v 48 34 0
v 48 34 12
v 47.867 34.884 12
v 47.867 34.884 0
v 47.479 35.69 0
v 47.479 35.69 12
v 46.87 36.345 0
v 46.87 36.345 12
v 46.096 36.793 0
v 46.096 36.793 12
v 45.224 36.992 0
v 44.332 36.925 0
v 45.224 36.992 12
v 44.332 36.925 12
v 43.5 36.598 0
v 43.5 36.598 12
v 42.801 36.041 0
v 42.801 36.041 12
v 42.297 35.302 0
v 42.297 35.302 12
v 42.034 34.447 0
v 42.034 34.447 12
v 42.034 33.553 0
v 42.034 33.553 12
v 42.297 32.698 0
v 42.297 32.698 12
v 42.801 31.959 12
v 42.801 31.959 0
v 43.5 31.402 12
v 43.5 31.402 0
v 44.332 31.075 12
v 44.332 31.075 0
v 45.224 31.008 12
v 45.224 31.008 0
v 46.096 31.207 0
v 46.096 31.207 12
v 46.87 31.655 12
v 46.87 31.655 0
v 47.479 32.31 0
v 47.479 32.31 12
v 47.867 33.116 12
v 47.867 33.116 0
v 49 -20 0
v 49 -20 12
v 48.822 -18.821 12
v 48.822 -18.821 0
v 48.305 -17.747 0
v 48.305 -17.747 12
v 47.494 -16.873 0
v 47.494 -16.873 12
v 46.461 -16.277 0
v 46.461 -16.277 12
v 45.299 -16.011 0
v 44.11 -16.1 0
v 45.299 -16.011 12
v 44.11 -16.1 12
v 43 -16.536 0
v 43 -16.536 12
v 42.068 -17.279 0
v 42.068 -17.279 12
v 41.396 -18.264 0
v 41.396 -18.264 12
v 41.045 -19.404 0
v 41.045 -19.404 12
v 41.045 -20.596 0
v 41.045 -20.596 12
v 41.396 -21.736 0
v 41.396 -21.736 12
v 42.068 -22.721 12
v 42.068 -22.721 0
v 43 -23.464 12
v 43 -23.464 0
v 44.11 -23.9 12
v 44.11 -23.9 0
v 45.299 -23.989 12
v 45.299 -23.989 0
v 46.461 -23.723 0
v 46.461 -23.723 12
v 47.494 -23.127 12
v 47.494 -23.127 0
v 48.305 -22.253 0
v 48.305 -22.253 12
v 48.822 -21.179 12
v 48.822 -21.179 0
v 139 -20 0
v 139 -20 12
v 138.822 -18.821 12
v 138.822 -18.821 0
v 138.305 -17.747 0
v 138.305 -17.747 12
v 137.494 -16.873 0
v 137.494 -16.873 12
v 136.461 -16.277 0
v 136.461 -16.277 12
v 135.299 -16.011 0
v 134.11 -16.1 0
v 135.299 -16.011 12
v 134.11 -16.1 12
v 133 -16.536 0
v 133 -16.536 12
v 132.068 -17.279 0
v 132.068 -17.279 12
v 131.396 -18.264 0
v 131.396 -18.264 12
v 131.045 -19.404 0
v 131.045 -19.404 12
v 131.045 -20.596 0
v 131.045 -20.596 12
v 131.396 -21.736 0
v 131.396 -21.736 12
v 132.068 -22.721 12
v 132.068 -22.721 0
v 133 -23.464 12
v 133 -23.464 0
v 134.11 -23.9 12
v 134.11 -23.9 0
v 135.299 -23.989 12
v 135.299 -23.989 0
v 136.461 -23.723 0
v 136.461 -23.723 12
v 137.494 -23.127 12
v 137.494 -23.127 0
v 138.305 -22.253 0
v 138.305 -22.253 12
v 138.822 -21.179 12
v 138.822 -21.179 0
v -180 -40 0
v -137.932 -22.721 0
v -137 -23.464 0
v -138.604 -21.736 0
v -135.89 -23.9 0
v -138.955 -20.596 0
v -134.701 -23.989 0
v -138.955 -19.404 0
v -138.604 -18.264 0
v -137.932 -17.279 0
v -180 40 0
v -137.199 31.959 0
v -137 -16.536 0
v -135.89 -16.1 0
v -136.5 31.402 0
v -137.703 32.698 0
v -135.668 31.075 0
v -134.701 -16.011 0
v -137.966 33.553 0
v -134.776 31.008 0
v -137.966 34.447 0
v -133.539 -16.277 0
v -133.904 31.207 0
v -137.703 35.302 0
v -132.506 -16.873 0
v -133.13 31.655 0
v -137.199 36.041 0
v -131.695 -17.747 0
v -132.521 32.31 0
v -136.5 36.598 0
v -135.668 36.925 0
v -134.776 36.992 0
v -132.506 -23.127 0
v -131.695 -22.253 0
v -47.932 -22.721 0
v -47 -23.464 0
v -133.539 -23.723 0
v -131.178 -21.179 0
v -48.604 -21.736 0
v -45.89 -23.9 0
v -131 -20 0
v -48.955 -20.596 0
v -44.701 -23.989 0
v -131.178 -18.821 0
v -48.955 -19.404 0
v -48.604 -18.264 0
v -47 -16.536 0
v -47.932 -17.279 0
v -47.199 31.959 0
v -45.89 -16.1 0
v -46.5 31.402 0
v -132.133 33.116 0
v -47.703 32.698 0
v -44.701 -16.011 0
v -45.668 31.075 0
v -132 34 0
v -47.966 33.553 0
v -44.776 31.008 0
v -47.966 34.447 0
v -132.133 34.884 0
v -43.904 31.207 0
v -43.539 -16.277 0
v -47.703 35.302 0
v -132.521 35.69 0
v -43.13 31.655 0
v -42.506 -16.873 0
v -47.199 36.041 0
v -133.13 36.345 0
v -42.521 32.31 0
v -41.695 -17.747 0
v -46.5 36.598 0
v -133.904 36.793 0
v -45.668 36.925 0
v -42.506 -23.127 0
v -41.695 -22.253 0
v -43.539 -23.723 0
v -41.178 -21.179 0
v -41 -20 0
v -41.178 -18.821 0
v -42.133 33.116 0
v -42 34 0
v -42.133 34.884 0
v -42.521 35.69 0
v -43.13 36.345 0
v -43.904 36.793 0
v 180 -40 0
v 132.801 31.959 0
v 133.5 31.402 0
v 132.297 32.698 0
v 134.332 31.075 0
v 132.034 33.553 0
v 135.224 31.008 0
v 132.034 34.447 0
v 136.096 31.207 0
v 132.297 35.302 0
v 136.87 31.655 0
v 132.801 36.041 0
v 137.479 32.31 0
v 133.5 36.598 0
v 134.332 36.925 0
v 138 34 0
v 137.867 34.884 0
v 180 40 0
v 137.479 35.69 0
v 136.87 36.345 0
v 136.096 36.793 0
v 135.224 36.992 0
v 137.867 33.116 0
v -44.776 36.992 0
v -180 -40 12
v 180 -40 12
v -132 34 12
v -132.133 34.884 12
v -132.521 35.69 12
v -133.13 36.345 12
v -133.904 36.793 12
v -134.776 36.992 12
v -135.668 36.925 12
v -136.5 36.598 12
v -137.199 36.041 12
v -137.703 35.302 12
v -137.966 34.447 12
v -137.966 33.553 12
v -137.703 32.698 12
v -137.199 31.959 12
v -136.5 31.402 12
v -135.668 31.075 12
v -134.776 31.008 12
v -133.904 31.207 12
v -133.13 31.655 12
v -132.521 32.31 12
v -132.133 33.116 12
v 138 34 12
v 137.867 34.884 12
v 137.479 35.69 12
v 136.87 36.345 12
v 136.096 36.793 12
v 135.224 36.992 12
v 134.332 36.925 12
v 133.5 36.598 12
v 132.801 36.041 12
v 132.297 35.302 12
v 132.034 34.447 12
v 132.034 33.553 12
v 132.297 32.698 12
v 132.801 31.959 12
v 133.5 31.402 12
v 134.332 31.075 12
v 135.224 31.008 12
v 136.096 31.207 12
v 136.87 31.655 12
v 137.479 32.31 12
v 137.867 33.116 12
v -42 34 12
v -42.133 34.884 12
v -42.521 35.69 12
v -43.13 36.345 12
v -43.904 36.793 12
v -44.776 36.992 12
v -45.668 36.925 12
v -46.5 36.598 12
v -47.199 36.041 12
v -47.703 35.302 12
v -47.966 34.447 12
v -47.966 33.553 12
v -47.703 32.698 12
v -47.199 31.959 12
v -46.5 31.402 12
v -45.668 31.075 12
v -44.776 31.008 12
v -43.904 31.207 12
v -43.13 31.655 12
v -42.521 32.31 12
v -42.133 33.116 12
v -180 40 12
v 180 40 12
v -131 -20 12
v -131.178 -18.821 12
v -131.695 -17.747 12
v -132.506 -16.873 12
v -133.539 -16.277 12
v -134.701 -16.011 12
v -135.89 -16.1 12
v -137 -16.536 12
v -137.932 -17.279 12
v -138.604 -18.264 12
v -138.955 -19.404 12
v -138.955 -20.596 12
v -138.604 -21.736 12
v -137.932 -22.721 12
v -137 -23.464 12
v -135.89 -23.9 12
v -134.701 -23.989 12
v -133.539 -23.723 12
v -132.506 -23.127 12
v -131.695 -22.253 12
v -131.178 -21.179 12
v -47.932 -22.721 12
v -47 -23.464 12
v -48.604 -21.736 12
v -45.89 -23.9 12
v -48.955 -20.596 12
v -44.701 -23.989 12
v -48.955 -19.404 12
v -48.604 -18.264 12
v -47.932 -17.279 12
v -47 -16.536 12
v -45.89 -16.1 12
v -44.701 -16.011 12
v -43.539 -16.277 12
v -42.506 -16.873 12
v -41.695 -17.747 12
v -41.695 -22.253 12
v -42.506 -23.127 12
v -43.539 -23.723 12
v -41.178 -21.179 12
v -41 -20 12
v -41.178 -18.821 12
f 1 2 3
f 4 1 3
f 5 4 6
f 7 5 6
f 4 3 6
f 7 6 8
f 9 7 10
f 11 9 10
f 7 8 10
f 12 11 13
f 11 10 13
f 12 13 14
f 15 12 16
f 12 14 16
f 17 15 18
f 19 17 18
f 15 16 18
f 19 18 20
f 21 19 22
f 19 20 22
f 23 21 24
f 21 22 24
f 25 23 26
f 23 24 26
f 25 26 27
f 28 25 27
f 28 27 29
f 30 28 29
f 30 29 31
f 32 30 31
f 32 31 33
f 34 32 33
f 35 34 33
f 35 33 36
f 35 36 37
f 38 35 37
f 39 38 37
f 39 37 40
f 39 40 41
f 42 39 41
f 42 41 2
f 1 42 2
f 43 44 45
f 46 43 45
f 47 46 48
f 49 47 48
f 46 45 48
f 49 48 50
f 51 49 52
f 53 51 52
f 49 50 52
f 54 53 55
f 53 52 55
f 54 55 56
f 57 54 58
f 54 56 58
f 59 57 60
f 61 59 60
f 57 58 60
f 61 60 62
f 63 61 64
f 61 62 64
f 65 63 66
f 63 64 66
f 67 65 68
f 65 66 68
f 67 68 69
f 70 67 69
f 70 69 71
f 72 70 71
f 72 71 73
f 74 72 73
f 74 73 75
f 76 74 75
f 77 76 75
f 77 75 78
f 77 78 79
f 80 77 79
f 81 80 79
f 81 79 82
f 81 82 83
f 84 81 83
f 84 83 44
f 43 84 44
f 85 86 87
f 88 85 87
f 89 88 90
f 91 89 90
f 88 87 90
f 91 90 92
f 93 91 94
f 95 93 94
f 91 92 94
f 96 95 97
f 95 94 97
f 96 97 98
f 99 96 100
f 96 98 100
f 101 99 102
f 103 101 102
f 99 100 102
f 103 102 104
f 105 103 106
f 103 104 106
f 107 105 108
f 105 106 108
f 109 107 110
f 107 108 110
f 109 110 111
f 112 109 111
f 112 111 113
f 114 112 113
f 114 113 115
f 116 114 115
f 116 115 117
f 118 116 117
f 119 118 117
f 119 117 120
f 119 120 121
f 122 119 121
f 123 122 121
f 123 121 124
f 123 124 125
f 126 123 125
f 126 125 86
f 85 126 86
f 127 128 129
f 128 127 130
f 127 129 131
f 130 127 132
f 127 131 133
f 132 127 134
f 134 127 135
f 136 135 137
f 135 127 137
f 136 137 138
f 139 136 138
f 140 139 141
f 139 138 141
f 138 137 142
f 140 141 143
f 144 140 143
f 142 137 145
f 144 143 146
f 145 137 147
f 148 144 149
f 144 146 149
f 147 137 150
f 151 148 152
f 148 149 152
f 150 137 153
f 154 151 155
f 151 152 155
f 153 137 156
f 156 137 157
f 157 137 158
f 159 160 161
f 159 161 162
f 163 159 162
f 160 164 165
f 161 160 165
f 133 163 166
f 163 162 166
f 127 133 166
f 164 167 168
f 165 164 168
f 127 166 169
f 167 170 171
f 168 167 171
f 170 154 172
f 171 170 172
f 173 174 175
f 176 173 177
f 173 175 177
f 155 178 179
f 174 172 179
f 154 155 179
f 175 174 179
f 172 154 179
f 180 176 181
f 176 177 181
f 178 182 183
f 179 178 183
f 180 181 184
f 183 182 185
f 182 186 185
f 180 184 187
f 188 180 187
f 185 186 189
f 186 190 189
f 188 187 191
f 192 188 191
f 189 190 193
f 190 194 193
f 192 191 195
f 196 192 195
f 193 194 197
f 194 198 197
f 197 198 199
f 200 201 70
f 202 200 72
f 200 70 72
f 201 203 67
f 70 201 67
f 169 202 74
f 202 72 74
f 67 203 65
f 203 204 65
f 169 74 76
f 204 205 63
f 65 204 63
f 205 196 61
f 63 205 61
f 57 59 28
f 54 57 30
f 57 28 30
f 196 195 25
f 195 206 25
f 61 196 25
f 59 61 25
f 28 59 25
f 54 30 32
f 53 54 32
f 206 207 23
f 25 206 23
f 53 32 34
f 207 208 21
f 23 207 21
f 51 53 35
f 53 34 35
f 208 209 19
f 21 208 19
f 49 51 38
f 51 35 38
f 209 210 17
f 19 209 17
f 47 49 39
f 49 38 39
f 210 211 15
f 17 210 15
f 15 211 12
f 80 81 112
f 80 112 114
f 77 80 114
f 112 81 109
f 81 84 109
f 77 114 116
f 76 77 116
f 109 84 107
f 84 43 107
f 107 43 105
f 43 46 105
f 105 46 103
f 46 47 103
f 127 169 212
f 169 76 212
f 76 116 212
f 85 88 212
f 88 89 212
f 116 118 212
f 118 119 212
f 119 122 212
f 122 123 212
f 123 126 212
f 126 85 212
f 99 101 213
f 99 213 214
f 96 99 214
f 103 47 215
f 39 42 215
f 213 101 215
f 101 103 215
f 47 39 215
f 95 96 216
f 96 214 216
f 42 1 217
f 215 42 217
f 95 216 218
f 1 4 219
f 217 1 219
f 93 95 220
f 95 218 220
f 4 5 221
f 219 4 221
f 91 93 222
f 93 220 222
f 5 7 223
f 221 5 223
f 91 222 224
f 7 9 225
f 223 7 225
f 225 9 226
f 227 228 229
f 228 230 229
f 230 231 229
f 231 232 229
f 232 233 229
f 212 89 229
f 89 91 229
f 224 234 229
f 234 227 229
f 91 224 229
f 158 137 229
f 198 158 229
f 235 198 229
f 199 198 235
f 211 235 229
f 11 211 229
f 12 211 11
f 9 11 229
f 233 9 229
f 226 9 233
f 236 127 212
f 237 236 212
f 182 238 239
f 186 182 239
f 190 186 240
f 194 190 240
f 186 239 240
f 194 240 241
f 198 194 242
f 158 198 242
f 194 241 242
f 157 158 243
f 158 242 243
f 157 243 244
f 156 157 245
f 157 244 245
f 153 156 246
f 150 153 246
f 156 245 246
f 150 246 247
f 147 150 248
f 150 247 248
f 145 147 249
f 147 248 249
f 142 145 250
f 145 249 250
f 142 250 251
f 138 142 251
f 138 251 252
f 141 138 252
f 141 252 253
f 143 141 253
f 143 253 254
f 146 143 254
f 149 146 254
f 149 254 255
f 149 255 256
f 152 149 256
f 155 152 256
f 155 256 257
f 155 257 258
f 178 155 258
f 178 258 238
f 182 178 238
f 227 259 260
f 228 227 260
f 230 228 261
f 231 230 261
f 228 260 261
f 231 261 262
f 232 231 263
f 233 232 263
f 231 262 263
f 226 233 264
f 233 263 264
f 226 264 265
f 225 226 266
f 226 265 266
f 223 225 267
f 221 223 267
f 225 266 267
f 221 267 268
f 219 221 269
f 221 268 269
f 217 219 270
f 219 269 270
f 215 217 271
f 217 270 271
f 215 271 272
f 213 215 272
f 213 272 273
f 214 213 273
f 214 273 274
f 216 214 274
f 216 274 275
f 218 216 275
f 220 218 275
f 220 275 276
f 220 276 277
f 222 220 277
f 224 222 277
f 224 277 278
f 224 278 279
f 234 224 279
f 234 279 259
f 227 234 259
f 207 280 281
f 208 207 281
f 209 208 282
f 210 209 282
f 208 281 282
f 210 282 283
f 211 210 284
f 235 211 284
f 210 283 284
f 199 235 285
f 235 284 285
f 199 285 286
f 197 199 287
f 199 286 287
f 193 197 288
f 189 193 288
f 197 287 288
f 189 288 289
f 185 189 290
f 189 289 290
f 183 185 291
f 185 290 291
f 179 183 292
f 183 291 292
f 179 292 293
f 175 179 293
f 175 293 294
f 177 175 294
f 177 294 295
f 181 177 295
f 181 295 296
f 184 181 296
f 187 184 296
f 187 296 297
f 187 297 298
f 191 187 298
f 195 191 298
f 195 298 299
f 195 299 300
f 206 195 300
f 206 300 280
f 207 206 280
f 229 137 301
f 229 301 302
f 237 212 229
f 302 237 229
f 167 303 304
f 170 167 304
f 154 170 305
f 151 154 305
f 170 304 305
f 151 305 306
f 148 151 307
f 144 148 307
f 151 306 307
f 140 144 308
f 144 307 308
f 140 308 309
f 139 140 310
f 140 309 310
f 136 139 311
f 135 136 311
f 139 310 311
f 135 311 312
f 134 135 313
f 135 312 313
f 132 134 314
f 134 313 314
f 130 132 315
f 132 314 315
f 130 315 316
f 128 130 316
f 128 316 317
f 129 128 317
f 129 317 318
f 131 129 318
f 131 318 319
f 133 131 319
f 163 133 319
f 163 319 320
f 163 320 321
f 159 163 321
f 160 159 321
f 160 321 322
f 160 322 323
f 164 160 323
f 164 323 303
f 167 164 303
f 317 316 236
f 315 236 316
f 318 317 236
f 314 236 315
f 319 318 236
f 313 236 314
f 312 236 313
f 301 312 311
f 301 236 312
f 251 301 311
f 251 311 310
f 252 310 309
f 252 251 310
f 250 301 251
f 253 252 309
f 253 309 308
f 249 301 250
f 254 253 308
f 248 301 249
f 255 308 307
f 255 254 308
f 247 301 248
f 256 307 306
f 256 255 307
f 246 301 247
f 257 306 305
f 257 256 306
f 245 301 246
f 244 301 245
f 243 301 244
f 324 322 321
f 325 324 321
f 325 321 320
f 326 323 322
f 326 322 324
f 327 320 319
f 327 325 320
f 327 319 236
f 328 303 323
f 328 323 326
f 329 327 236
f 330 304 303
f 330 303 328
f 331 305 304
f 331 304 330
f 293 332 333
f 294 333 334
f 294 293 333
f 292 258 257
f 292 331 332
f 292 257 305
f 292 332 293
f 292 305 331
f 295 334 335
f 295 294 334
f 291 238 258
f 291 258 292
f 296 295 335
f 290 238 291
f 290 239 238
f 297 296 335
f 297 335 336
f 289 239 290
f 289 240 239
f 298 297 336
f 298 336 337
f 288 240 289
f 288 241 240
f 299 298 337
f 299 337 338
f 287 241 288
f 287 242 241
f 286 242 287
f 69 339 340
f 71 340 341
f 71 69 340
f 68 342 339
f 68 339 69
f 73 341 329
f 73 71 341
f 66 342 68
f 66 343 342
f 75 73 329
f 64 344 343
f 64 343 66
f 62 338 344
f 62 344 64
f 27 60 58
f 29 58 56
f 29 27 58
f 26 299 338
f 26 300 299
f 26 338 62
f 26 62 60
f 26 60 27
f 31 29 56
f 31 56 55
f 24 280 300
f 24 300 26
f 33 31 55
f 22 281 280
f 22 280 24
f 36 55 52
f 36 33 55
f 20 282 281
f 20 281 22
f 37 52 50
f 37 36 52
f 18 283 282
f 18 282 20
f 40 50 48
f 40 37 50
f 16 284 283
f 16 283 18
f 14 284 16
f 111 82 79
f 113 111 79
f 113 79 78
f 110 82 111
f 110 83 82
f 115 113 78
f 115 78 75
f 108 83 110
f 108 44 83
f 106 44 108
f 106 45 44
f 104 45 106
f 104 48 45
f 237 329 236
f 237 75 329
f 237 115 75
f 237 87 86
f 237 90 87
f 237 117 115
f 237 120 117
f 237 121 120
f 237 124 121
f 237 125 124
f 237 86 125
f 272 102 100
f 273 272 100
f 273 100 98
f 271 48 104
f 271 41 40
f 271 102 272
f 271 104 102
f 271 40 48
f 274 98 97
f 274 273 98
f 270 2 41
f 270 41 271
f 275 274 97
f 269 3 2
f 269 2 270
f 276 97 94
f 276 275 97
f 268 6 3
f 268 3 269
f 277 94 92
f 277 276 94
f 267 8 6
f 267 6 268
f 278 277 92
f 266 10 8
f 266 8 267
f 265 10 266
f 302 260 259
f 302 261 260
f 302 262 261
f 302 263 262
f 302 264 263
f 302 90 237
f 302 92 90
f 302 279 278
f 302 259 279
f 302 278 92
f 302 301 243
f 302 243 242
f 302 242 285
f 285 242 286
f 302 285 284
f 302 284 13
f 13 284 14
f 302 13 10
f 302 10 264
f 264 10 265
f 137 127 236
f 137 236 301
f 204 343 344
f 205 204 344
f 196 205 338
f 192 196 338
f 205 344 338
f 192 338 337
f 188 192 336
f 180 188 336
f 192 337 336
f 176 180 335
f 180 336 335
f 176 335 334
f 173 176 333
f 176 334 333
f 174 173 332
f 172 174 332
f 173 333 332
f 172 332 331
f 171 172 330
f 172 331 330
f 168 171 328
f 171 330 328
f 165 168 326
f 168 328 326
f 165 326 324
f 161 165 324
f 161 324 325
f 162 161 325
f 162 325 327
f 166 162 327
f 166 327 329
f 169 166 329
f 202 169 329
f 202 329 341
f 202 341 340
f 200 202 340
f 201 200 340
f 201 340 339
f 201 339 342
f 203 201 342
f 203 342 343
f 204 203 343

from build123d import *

# Parameters (mm, degrees)
SKETCH1_W           = 360
SKETCH1_H           = 80
BOSS_EXTRUDE1_DEPTH = 12
CUT_EXTRUDE1_REACH  = 186.781
SKETCH2_R           = 3
SKETCH2_R_2         = 4
LPATTERN1_COUNT     = 4
LPATTERN1_PITCH     = 90


with BuildPart() as part:
    # Sketch1 → Boss-Extrude1 (new body)
    with BuildSketch(Plane.XY):
        Rectangle(SKETCH1_W, SKETCH1_H)
    extrude(amount=BOSS_EXTRUDE1_DEPTH)

    # Sketch2 → Cut-Extrude1 (cut, up to next)
    with BuildSketch(Plane.XY.offset(12), mode=Mode.PRIVATE) as cut_extrude1_sk1:
        with Locations((-135, 34)):
            Circle(SKETCH2_R)
    cut_extrude1_tool1 = extrude(cut_extrude1_sk1.sketch, amount=-CUT_EXTRUDE1_REACH, mode=Mode.PRIVATE) & part.part
    # Sketch2 → Cut-Extrude1 (cut, up to next)
    with BuildSketch(Plane.XY.offset(12), mode=Mode.PRIVATE) as cut_extrude1_sk2:
        with Locations((-135, -20)):
            Circle(SKETCH2_R_2)
    cut_extrude1_tool2 = extrude(cut_extrude1_sk2.sketch, amount=-CUT_EXTRUDE1_REACH, mode=Mode.PRIVATE) & part.part
    cut_extrude1_1 = cut_extrude1_tool1.solids().sort_by_distance((-135, 34, 12))[0]
    add(cut_extrude1_1, mode=Mode.SUBTRACT)
    cut_extrude1_2 = cut_extrude1_tool2.solids().sort_by_distance((-135, -20, 12))[0]
    add(cut_extrude1_2, mode=Mode.SUBTRACT)
    cut_extrude1 = cut_extrude1_1 + cut_extrude1_2  # Cut-Extrude1 as one shape, for the pattern or mirror that repeats it

    # LPattern1: Cut-Extrude1 ×4
    with Locations(*[(i * LPATTERN1_PITCH, 0, 0) for i in range(1, LPATTERN1_COUNT)]):
        add(cut_extrude1, mode=Mode.SUBTRACT)


solid = part.part
